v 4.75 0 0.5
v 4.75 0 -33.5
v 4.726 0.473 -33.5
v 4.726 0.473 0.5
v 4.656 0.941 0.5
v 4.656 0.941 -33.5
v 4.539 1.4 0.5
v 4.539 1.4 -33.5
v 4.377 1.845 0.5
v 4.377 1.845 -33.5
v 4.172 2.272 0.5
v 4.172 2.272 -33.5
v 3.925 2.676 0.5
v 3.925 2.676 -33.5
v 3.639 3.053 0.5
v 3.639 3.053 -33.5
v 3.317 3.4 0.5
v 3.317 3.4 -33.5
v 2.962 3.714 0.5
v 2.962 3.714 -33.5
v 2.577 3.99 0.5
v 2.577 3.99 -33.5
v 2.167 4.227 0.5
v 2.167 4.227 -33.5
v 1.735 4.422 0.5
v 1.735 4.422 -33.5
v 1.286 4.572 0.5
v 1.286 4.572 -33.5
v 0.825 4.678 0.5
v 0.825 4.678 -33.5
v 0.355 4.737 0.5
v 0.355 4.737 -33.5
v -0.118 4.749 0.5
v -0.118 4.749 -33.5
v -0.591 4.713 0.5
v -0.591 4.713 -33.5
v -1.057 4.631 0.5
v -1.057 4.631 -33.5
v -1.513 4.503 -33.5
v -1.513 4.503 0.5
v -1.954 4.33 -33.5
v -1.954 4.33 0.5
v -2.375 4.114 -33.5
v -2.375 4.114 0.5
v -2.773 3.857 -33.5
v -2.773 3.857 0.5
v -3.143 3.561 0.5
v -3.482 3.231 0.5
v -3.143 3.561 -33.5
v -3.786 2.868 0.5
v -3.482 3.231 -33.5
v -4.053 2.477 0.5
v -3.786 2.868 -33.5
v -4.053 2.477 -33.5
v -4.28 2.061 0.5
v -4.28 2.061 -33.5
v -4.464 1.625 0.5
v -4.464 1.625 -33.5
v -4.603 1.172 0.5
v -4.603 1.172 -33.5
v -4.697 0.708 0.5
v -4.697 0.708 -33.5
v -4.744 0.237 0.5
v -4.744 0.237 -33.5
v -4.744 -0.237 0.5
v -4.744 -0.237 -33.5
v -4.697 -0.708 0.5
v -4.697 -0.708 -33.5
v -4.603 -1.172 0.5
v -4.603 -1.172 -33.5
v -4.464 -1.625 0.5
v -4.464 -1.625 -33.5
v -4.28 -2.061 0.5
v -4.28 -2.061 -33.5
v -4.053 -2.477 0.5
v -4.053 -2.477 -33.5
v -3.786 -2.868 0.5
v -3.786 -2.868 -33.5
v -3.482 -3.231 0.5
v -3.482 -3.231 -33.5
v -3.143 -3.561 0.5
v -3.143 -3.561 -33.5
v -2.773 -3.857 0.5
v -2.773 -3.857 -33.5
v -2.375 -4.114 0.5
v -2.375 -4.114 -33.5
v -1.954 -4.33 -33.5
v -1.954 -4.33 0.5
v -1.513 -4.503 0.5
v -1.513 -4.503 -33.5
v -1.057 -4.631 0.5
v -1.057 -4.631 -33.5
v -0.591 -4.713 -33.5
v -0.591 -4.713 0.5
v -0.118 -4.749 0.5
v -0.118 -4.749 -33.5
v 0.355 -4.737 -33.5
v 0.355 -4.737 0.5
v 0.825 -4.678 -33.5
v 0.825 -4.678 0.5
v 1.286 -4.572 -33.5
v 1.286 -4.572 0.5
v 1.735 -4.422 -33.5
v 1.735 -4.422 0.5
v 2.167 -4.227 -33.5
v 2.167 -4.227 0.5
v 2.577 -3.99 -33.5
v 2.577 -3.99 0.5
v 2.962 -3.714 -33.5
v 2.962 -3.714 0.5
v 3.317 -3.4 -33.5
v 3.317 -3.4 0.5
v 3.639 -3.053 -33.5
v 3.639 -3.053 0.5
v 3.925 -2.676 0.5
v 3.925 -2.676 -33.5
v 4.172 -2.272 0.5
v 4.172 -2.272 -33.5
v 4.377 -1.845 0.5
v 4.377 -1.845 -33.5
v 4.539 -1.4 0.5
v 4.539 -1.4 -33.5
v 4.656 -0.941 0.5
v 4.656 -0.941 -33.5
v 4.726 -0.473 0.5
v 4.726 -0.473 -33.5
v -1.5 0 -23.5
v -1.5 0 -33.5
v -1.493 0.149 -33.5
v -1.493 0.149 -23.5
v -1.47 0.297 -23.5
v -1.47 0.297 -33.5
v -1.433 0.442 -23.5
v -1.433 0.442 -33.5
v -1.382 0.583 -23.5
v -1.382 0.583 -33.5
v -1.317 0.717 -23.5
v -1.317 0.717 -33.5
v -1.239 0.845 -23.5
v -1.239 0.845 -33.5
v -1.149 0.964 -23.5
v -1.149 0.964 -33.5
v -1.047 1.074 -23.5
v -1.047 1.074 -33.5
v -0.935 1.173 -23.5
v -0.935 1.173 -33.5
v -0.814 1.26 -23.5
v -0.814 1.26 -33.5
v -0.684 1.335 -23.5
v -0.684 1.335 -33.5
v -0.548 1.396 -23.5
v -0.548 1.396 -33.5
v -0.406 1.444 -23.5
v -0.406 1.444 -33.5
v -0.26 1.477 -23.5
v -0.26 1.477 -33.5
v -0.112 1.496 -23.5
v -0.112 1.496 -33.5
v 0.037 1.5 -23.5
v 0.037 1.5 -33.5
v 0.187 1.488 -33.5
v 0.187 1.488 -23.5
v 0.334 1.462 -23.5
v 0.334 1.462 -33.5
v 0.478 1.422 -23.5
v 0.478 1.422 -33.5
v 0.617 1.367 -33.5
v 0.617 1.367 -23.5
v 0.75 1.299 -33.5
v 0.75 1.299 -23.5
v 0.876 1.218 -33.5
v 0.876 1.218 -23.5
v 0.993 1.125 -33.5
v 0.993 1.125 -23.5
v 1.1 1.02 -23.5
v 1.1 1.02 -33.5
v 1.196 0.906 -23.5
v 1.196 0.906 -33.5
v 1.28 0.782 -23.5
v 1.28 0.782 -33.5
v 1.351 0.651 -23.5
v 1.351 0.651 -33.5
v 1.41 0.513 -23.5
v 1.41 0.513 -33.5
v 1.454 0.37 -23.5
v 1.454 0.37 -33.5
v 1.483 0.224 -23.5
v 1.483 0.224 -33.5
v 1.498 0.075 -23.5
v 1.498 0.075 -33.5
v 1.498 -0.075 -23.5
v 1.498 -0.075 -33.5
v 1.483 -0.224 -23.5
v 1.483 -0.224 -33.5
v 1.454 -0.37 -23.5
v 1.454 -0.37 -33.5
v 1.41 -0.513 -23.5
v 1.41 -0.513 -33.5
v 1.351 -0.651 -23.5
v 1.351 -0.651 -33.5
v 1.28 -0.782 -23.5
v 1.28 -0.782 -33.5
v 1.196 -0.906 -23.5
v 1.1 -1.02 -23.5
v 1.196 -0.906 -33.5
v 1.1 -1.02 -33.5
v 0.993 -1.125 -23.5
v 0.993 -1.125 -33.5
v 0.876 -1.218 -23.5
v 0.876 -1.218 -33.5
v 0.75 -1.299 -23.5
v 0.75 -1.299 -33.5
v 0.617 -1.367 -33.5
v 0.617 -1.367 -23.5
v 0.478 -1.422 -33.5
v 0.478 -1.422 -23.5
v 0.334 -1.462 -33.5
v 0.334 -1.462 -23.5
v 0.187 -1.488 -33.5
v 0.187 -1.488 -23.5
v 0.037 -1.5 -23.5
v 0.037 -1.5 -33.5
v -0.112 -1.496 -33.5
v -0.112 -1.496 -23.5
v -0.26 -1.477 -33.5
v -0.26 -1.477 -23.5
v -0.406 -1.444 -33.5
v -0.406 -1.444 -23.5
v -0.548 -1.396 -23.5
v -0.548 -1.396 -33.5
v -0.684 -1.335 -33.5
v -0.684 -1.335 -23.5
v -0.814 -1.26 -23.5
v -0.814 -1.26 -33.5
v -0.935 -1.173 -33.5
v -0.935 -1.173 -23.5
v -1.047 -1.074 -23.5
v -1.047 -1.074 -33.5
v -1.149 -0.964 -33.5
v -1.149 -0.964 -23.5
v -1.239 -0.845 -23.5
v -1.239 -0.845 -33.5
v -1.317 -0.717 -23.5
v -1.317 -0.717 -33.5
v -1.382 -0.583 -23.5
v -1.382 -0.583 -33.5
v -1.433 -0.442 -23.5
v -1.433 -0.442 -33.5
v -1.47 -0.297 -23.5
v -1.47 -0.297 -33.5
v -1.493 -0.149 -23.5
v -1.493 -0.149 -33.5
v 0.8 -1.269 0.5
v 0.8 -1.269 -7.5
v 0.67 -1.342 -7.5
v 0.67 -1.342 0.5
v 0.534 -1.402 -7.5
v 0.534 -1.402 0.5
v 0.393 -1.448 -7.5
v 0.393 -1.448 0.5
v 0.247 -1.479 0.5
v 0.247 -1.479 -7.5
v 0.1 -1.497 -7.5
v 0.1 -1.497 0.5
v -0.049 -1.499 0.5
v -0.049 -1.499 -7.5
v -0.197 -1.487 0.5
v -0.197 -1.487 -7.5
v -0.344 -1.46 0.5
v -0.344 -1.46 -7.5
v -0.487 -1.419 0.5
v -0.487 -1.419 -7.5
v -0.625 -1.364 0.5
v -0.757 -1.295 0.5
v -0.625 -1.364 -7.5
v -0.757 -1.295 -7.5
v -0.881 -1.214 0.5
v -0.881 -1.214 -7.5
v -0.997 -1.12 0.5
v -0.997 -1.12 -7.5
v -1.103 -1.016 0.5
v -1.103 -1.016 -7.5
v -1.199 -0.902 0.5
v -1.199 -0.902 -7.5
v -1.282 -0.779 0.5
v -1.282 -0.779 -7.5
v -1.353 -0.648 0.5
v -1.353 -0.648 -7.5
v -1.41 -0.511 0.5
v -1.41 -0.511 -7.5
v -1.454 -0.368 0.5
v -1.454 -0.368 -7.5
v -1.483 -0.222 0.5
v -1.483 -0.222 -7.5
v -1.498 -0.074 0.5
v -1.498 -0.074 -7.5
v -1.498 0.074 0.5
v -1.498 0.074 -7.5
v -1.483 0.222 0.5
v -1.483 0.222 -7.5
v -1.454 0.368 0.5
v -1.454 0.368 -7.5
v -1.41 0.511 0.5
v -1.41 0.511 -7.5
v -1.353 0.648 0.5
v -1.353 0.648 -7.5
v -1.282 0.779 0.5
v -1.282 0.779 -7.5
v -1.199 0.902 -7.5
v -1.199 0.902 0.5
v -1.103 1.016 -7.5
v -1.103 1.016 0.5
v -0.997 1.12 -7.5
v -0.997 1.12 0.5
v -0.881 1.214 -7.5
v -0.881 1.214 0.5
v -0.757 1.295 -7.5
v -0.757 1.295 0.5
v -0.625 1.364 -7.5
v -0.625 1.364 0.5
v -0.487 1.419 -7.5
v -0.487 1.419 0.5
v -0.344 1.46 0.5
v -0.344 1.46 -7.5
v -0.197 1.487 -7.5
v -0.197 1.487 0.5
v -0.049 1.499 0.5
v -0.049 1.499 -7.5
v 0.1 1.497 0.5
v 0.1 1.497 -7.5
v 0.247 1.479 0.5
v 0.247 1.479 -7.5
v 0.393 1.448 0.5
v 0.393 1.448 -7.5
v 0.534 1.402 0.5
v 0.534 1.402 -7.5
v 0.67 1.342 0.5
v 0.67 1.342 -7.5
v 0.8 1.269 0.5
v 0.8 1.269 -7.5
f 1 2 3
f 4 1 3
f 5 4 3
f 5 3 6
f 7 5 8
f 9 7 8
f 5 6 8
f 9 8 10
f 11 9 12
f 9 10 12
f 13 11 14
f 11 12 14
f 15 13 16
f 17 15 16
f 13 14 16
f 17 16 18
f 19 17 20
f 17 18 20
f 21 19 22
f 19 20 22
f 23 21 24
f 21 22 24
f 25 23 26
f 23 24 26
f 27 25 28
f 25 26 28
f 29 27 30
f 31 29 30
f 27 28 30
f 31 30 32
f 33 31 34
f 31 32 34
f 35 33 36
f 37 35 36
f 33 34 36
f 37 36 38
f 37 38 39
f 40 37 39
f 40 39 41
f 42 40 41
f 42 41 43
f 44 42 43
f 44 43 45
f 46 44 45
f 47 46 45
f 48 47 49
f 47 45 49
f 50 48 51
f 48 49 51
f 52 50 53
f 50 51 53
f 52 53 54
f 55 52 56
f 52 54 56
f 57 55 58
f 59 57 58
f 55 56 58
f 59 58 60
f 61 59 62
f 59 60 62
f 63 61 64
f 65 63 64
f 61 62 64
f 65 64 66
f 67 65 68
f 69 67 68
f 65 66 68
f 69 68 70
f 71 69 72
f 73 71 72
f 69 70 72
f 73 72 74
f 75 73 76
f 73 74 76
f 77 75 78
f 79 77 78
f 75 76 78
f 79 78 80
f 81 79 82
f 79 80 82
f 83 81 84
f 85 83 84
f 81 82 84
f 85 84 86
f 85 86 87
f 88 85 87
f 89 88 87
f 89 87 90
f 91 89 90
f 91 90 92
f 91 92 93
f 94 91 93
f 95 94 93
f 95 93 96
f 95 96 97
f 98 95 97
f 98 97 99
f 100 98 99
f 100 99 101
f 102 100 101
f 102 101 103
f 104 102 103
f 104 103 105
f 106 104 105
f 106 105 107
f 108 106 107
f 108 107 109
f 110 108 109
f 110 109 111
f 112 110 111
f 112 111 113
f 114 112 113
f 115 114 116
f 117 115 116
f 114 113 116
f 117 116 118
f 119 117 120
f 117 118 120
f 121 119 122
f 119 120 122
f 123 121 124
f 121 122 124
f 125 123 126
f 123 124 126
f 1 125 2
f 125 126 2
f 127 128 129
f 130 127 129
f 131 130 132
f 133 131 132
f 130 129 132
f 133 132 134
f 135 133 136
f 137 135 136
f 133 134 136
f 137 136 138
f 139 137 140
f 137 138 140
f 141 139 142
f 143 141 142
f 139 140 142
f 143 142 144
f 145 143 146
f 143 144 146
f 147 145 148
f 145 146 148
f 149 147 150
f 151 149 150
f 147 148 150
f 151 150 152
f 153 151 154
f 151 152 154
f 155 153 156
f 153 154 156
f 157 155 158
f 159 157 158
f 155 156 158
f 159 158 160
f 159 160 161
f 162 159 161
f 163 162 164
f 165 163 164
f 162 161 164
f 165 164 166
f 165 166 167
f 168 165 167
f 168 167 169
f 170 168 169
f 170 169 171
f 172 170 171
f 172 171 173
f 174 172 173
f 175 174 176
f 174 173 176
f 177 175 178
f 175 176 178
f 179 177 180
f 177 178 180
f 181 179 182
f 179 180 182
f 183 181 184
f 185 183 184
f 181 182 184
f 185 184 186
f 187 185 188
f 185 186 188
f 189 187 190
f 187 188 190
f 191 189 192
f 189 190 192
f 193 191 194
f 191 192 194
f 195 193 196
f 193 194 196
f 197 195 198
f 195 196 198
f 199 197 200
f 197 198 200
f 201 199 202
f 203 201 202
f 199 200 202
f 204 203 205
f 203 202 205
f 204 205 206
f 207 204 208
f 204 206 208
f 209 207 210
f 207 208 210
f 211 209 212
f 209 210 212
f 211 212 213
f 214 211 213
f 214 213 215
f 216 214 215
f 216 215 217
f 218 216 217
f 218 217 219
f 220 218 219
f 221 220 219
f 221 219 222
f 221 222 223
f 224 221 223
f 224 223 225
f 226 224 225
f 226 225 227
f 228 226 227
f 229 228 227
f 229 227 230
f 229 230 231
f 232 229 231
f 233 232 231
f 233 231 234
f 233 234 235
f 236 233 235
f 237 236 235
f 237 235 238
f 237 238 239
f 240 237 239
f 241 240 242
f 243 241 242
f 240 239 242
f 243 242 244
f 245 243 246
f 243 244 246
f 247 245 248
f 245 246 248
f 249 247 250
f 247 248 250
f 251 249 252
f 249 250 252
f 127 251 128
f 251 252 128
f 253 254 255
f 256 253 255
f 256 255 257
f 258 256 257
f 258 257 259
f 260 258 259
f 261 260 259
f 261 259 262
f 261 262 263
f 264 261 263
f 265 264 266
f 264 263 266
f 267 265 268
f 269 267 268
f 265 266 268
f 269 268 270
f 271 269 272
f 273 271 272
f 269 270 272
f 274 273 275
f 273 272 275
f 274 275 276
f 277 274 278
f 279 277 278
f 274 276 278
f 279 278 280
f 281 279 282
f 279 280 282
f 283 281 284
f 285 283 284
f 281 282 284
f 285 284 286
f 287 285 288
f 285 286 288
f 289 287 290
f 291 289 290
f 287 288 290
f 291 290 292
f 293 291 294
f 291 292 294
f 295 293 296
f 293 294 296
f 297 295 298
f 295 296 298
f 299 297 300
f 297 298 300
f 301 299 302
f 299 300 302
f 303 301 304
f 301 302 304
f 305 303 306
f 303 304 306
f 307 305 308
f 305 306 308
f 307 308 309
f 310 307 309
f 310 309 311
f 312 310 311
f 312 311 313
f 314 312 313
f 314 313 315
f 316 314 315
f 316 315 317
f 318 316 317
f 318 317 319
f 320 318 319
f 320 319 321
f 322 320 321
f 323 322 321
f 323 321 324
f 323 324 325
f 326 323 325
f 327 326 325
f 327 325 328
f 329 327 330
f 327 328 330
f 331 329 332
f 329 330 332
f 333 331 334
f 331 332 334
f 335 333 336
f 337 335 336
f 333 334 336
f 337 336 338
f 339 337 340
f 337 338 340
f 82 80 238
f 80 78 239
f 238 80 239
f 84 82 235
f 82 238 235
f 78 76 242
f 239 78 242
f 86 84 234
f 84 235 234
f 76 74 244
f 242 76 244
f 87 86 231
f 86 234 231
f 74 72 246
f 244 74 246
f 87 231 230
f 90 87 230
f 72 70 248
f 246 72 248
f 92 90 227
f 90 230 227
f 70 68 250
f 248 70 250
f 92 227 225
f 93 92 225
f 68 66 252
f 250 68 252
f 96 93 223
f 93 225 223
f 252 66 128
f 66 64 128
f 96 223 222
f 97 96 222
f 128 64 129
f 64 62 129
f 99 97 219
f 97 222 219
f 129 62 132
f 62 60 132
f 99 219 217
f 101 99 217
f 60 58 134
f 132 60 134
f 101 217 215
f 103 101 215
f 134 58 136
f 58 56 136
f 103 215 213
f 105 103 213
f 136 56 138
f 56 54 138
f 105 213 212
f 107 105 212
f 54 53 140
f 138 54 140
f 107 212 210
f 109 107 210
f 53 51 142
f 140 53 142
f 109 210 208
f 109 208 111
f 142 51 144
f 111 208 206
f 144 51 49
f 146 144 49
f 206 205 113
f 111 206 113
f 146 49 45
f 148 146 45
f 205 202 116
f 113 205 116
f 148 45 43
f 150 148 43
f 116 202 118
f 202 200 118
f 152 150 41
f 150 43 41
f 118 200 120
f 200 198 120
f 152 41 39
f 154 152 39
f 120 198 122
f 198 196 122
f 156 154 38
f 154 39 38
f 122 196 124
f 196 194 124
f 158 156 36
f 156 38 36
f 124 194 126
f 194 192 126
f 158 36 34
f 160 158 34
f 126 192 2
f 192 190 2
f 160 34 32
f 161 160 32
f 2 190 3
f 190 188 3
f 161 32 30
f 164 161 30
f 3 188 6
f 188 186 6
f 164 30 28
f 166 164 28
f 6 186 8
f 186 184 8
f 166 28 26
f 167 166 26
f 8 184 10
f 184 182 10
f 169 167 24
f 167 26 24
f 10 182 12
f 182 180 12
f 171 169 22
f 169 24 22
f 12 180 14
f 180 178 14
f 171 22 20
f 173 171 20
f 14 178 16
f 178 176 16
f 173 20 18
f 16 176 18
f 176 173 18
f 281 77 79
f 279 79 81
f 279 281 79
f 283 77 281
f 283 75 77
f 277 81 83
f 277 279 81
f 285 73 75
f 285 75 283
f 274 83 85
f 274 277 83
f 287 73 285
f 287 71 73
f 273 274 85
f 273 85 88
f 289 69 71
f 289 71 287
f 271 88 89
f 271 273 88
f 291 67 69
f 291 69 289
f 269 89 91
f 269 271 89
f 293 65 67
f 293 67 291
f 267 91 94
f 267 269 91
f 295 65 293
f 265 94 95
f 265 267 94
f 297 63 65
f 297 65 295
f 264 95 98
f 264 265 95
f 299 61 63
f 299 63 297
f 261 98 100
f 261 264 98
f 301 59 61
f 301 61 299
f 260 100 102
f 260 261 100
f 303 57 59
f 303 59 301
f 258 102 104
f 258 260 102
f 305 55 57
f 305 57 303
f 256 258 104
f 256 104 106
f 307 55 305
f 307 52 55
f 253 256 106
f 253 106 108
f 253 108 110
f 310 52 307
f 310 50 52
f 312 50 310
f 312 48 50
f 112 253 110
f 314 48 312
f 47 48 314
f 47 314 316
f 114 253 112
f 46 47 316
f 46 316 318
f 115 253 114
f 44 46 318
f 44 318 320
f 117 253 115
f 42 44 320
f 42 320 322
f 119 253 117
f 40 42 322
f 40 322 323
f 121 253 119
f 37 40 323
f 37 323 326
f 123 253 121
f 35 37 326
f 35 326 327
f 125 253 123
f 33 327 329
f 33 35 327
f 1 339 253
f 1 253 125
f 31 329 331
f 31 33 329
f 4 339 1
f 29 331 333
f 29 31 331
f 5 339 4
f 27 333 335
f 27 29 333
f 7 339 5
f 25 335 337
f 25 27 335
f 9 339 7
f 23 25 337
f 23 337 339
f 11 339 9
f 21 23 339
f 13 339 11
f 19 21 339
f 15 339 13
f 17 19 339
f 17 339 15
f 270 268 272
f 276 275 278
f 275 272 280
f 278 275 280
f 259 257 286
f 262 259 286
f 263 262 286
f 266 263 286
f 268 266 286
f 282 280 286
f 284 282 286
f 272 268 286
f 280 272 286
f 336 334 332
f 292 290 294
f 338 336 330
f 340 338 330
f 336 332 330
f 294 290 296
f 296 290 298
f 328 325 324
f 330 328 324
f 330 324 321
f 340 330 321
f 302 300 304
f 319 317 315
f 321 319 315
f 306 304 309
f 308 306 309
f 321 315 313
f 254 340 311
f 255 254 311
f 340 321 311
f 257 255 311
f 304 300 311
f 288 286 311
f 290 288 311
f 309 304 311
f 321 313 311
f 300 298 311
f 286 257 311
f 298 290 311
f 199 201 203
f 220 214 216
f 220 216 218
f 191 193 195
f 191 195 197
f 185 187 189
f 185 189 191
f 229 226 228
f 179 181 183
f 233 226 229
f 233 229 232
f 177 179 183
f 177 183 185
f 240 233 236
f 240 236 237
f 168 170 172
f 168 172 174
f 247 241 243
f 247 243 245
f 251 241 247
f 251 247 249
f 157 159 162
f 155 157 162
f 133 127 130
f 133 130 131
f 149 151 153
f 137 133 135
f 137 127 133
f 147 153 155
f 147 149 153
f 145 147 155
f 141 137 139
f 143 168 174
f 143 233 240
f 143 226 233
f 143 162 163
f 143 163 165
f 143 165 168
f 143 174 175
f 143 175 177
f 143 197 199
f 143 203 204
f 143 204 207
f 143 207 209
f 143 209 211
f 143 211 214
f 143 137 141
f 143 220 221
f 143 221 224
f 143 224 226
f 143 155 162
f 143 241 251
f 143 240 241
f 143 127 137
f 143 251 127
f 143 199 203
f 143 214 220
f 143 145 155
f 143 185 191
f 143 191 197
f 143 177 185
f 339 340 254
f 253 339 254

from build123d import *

# Parameters (mm, degrees)
EXTRUDE_1_DEPTH      = 0.5
EXTRUDE_1_DEPTH_BACK = 33.5
SKETCH_1_R           = 4.75
SKETCH_2_R           = 1.5
CUT_EXTRUDE_1_DEPTH  = 10
CUT_EXTRUDE_START    = -8
CUT_EXTRUDE_2_DEPTH  = 8


with BuildPart() as part:
    # 草图1 → 凸台-拉伸1 (new, two sides: drawn at the far end of the back side and taken through both)
    with BuildSketch(Plane.XY.offset(-EXTRUDE_1_DEPTH_BACK)):
        Circle(SKETCH_1_R)
    extrude(amount=EXTRUDE_1_DEPTH + EXTRUDE_1_DEPTH_BACK)

    # 草图2 → 切除-拉伸1 (cut)
    with BuildSketch(Plane(origin=(0, 0, -33.5), x_dir=(-1, 0, 0), z_dir=(0, 0, -1))):
        Circle(SKETCH_2_R)
    extrude(amount=-CUT_EXTRUDE_1_DEPTH, mode=Mode.SUBTRACT)

    # 草图3 → 切除-拉伸2 (cut)
    with BuildSketch(Plane.XY.offset(0.5).offset(CUT_EXTRUDE_START)):
        with BuildLine():
            Line((0.8, 1.268857754), (0.8, -1.268857754))
            ThreePointArc((0.8, -1.268857754), (-1.5, 0), (0.8, 1.268857754))
        make_face()
    extrude(amount=CUT_EXTRUDE_2_DEPTH, mode=Mode.SUBTRACT)


solid = part.part
